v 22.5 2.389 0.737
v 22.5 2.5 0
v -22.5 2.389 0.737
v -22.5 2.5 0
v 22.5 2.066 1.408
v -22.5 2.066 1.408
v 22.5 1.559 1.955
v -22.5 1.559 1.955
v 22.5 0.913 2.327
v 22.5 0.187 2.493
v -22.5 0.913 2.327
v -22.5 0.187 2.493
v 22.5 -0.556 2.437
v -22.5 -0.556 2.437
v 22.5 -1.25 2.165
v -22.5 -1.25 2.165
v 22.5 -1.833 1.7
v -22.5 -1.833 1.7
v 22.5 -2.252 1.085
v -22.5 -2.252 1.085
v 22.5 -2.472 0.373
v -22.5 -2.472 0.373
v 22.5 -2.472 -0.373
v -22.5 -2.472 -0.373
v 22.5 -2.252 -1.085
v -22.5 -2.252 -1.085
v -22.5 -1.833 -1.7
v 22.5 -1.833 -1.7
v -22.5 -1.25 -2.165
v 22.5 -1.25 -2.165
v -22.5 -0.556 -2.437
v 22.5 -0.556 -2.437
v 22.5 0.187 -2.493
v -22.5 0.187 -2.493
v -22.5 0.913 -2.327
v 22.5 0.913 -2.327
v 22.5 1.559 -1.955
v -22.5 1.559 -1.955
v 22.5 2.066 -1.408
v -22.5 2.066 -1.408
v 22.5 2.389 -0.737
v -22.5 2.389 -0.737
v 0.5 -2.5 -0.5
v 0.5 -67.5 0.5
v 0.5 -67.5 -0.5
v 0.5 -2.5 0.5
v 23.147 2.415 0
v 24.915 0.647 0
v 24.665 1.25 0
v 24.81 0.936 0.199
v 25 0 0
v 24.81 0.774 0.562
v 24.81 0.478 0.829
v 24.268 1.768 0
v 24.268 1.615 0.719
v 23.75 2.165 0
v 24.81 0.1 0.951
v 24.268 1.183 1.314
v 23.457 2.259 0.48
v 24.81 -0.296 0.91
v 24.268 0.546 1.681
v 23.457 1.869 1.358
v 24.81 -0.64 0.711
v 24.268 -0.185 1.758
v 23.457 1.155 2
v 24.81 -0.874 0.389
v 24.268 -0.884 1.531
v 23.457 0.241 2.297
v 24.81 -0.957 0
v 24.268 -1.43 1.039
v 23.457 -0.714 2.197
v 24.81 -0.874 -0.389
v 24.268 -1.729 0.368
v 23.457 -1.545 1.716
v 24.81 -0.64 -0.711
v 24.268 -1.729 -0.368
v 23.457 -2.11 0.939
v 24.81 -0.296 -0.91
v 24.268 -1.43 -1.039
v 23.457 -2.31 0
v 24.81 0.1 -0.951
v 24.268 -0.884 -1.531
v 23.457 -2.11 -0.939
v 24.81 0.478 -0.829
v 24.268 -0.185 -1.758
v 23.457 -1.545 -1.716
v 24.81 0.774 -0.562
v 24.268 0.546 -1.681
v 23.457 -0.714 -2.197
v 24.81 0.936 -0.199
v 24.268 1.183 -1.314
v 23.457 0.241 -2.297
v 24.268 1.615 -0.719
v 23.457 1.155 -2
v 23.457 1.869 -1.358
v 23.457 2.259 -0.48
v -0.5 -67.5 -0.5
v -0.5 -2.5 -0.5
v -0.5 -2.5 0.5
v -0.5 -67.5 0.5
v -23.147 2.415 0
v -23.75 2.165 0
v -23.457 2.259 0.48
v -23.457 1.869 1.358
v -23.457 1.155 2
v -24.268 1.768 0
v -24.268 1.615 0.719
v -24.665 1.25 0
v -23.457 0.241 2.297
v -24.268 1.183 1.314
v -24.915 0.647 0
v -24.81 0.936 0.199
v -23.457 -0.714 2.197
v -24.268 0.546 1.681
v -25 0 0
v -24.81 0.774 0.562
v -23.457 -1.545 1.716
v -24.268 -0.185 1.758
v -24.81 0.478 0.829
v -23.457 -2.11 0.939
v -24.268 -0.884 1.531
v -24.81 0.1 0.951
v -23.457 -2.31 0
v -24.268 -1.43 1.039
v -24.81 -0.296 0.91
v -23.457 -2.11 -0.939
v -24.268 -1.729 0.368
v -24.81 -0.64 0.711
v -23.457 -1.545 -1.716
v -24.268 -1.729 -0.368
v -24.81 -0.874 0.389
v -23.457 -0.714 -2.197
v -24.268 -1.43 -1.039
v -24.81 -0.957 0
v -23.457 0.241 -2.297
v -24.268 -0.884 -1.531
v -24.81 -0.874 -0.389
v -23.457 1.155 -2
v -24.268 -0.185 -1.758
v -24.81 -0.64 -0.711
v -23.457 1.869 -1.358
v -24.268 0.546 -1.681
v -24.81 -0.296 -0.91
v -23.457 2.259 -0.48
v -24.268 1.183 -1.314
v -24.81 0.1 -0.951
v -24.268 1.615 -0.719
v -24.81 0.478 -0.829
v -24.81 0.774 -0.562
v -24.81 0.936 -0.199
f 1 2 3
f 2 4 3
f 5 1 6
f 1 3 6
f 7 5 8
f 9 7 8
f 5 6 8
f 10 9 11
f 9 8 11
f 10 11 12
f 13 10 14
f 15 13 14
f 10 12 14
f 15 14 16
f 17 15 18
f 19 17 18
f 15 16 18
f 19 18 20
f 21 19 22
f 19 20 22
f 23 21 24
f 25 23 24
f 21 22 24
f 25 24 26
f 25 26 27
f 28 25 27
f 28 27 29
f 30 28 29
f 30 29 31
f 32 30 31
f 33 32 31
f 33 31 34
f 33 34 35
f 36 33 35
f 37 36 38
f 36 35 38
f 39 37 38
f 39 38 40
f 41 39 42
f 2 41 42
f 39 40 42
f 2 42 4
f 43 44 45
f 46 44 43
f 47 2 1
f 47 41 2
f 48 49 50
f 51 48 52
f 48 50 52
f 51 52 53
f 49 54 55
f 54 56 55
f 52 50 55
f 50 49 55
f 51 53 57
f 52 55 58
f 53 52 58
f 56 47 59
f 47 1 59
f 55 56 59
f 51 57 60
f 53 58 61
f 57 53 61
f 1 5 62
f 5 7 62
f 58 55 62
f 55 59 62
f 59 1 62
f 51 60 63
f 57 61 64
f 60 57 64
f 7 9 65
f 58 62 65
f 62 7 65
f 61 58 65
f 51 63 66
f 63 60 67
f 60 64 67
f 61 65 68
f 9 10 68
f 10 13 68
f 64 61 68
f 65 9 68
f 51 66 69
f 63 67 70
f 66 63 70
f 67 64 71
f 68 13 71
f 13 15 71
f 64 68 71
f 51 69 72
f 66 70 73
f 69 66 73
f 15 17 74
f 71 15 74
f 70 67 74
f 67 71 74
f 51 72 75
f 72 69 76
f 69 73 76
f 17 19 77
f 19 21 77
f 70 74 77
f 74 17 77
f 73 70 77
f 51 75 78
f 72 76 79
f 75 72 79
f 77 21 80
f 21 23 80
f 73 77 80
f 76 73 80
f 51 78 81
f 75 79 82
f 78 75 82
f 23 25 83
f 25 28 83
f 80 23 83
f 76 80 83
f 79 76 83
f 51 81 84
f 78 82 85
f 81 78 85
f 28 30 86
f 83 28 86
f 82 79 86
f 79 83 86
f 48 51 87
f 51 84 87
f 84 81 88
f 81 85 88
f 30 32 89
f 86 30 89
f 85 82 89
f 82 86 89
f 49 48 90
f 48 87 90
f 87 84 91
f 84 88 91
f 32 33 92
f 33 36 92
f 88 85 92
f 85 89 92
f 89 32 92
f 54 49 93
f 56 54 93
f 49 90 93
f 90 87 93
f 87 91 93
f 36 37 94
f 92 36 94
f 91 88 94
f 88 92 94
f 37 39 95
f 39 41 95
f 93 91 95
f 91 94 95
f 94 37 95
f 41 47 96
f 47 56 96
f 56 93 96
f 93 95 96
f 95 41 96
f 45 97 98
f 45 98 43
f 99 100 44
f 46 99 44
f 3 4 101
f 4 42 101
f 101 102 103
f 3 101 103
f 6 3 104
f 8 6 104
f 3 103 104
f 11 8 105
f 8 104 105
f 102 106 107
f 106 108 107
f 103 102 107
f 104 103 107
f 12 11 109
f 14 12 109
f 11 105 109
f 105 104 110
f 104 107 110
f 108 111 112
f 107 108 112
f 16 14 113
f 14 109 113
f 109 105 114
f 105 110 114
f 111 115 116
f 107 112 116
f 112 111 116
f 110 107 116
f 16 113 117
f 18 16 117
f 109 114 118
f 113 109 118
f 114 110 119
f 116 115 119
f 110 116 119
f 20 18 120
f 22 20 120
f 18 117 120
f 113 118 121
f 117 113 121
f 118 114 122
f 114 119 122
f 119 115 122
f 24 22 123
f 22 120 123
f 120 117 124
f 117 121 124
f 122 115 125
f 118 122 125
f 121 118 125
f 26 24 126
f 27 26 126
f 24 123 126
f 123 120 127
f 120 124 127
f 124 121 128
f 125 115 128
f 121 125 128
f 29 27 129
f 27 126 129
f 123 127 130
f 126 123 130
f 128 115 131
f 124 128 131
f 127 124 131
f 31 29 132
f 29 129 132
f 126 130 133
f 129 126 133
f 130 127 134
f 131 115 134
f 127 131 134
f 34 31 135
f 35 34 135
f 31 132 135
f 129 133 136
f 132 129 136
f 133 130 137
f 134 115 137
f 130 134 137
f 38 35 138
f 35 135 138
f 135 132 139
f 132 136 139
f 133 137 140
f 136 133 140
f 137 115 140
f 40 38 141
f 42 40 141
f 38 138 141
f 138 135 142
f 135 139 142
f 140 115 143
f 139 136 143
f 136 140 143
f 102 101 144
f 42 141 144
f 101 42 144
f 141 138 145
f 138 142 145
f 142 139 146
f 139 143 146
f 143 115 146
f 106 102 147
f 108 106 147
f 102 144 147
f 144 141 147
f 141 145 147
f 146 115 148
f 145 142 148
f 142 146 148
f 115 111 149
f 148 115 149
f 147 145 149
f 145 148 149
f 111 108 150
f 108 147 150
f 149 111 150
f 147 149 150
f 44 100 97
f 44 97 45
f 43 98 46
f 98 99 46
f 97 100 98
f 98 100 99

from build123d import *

# Parameters (mm, degrees)
SKETCH1_4_W         = 1
SKETCH1_4_H         = 65
BOSS_EXTRUDE1_DEPTH = 0.5


with BuildPart() as part:
    # Sketch1 → Revolve1 (revolve)
    with BuildSketch(Plane.XY):
        with BuildLine():
            Line((22.5, 2.5), (-22.5, 2.5))
            ThreePointArc((-22.5, 2.5), (-24.267766953, 1.767766953), (-25, 0))
            Line((-25, 0), (25, 0))
            ThreePointArc((25, 0), (24.267766953, 1.767766953), (22.5, 2.5))
        make_face()
    revolve(axis=Axis((-25, 0, 0), (1, 0, 0)))


with BuildPart() as body_2:
    # Sketch1<4> → Boss-Extrude1 (new, symmetric)
    with BuildSketch(Plane.XY):
        with Locations((0, -35)):
            Rectangle(SKETCH1_4_W, SKETCH1_4_H)
    extrude(amount=BOSS_EXTRUDE1_DEPTH, both=True)


solid = Compound([part.part, body_2.part])
